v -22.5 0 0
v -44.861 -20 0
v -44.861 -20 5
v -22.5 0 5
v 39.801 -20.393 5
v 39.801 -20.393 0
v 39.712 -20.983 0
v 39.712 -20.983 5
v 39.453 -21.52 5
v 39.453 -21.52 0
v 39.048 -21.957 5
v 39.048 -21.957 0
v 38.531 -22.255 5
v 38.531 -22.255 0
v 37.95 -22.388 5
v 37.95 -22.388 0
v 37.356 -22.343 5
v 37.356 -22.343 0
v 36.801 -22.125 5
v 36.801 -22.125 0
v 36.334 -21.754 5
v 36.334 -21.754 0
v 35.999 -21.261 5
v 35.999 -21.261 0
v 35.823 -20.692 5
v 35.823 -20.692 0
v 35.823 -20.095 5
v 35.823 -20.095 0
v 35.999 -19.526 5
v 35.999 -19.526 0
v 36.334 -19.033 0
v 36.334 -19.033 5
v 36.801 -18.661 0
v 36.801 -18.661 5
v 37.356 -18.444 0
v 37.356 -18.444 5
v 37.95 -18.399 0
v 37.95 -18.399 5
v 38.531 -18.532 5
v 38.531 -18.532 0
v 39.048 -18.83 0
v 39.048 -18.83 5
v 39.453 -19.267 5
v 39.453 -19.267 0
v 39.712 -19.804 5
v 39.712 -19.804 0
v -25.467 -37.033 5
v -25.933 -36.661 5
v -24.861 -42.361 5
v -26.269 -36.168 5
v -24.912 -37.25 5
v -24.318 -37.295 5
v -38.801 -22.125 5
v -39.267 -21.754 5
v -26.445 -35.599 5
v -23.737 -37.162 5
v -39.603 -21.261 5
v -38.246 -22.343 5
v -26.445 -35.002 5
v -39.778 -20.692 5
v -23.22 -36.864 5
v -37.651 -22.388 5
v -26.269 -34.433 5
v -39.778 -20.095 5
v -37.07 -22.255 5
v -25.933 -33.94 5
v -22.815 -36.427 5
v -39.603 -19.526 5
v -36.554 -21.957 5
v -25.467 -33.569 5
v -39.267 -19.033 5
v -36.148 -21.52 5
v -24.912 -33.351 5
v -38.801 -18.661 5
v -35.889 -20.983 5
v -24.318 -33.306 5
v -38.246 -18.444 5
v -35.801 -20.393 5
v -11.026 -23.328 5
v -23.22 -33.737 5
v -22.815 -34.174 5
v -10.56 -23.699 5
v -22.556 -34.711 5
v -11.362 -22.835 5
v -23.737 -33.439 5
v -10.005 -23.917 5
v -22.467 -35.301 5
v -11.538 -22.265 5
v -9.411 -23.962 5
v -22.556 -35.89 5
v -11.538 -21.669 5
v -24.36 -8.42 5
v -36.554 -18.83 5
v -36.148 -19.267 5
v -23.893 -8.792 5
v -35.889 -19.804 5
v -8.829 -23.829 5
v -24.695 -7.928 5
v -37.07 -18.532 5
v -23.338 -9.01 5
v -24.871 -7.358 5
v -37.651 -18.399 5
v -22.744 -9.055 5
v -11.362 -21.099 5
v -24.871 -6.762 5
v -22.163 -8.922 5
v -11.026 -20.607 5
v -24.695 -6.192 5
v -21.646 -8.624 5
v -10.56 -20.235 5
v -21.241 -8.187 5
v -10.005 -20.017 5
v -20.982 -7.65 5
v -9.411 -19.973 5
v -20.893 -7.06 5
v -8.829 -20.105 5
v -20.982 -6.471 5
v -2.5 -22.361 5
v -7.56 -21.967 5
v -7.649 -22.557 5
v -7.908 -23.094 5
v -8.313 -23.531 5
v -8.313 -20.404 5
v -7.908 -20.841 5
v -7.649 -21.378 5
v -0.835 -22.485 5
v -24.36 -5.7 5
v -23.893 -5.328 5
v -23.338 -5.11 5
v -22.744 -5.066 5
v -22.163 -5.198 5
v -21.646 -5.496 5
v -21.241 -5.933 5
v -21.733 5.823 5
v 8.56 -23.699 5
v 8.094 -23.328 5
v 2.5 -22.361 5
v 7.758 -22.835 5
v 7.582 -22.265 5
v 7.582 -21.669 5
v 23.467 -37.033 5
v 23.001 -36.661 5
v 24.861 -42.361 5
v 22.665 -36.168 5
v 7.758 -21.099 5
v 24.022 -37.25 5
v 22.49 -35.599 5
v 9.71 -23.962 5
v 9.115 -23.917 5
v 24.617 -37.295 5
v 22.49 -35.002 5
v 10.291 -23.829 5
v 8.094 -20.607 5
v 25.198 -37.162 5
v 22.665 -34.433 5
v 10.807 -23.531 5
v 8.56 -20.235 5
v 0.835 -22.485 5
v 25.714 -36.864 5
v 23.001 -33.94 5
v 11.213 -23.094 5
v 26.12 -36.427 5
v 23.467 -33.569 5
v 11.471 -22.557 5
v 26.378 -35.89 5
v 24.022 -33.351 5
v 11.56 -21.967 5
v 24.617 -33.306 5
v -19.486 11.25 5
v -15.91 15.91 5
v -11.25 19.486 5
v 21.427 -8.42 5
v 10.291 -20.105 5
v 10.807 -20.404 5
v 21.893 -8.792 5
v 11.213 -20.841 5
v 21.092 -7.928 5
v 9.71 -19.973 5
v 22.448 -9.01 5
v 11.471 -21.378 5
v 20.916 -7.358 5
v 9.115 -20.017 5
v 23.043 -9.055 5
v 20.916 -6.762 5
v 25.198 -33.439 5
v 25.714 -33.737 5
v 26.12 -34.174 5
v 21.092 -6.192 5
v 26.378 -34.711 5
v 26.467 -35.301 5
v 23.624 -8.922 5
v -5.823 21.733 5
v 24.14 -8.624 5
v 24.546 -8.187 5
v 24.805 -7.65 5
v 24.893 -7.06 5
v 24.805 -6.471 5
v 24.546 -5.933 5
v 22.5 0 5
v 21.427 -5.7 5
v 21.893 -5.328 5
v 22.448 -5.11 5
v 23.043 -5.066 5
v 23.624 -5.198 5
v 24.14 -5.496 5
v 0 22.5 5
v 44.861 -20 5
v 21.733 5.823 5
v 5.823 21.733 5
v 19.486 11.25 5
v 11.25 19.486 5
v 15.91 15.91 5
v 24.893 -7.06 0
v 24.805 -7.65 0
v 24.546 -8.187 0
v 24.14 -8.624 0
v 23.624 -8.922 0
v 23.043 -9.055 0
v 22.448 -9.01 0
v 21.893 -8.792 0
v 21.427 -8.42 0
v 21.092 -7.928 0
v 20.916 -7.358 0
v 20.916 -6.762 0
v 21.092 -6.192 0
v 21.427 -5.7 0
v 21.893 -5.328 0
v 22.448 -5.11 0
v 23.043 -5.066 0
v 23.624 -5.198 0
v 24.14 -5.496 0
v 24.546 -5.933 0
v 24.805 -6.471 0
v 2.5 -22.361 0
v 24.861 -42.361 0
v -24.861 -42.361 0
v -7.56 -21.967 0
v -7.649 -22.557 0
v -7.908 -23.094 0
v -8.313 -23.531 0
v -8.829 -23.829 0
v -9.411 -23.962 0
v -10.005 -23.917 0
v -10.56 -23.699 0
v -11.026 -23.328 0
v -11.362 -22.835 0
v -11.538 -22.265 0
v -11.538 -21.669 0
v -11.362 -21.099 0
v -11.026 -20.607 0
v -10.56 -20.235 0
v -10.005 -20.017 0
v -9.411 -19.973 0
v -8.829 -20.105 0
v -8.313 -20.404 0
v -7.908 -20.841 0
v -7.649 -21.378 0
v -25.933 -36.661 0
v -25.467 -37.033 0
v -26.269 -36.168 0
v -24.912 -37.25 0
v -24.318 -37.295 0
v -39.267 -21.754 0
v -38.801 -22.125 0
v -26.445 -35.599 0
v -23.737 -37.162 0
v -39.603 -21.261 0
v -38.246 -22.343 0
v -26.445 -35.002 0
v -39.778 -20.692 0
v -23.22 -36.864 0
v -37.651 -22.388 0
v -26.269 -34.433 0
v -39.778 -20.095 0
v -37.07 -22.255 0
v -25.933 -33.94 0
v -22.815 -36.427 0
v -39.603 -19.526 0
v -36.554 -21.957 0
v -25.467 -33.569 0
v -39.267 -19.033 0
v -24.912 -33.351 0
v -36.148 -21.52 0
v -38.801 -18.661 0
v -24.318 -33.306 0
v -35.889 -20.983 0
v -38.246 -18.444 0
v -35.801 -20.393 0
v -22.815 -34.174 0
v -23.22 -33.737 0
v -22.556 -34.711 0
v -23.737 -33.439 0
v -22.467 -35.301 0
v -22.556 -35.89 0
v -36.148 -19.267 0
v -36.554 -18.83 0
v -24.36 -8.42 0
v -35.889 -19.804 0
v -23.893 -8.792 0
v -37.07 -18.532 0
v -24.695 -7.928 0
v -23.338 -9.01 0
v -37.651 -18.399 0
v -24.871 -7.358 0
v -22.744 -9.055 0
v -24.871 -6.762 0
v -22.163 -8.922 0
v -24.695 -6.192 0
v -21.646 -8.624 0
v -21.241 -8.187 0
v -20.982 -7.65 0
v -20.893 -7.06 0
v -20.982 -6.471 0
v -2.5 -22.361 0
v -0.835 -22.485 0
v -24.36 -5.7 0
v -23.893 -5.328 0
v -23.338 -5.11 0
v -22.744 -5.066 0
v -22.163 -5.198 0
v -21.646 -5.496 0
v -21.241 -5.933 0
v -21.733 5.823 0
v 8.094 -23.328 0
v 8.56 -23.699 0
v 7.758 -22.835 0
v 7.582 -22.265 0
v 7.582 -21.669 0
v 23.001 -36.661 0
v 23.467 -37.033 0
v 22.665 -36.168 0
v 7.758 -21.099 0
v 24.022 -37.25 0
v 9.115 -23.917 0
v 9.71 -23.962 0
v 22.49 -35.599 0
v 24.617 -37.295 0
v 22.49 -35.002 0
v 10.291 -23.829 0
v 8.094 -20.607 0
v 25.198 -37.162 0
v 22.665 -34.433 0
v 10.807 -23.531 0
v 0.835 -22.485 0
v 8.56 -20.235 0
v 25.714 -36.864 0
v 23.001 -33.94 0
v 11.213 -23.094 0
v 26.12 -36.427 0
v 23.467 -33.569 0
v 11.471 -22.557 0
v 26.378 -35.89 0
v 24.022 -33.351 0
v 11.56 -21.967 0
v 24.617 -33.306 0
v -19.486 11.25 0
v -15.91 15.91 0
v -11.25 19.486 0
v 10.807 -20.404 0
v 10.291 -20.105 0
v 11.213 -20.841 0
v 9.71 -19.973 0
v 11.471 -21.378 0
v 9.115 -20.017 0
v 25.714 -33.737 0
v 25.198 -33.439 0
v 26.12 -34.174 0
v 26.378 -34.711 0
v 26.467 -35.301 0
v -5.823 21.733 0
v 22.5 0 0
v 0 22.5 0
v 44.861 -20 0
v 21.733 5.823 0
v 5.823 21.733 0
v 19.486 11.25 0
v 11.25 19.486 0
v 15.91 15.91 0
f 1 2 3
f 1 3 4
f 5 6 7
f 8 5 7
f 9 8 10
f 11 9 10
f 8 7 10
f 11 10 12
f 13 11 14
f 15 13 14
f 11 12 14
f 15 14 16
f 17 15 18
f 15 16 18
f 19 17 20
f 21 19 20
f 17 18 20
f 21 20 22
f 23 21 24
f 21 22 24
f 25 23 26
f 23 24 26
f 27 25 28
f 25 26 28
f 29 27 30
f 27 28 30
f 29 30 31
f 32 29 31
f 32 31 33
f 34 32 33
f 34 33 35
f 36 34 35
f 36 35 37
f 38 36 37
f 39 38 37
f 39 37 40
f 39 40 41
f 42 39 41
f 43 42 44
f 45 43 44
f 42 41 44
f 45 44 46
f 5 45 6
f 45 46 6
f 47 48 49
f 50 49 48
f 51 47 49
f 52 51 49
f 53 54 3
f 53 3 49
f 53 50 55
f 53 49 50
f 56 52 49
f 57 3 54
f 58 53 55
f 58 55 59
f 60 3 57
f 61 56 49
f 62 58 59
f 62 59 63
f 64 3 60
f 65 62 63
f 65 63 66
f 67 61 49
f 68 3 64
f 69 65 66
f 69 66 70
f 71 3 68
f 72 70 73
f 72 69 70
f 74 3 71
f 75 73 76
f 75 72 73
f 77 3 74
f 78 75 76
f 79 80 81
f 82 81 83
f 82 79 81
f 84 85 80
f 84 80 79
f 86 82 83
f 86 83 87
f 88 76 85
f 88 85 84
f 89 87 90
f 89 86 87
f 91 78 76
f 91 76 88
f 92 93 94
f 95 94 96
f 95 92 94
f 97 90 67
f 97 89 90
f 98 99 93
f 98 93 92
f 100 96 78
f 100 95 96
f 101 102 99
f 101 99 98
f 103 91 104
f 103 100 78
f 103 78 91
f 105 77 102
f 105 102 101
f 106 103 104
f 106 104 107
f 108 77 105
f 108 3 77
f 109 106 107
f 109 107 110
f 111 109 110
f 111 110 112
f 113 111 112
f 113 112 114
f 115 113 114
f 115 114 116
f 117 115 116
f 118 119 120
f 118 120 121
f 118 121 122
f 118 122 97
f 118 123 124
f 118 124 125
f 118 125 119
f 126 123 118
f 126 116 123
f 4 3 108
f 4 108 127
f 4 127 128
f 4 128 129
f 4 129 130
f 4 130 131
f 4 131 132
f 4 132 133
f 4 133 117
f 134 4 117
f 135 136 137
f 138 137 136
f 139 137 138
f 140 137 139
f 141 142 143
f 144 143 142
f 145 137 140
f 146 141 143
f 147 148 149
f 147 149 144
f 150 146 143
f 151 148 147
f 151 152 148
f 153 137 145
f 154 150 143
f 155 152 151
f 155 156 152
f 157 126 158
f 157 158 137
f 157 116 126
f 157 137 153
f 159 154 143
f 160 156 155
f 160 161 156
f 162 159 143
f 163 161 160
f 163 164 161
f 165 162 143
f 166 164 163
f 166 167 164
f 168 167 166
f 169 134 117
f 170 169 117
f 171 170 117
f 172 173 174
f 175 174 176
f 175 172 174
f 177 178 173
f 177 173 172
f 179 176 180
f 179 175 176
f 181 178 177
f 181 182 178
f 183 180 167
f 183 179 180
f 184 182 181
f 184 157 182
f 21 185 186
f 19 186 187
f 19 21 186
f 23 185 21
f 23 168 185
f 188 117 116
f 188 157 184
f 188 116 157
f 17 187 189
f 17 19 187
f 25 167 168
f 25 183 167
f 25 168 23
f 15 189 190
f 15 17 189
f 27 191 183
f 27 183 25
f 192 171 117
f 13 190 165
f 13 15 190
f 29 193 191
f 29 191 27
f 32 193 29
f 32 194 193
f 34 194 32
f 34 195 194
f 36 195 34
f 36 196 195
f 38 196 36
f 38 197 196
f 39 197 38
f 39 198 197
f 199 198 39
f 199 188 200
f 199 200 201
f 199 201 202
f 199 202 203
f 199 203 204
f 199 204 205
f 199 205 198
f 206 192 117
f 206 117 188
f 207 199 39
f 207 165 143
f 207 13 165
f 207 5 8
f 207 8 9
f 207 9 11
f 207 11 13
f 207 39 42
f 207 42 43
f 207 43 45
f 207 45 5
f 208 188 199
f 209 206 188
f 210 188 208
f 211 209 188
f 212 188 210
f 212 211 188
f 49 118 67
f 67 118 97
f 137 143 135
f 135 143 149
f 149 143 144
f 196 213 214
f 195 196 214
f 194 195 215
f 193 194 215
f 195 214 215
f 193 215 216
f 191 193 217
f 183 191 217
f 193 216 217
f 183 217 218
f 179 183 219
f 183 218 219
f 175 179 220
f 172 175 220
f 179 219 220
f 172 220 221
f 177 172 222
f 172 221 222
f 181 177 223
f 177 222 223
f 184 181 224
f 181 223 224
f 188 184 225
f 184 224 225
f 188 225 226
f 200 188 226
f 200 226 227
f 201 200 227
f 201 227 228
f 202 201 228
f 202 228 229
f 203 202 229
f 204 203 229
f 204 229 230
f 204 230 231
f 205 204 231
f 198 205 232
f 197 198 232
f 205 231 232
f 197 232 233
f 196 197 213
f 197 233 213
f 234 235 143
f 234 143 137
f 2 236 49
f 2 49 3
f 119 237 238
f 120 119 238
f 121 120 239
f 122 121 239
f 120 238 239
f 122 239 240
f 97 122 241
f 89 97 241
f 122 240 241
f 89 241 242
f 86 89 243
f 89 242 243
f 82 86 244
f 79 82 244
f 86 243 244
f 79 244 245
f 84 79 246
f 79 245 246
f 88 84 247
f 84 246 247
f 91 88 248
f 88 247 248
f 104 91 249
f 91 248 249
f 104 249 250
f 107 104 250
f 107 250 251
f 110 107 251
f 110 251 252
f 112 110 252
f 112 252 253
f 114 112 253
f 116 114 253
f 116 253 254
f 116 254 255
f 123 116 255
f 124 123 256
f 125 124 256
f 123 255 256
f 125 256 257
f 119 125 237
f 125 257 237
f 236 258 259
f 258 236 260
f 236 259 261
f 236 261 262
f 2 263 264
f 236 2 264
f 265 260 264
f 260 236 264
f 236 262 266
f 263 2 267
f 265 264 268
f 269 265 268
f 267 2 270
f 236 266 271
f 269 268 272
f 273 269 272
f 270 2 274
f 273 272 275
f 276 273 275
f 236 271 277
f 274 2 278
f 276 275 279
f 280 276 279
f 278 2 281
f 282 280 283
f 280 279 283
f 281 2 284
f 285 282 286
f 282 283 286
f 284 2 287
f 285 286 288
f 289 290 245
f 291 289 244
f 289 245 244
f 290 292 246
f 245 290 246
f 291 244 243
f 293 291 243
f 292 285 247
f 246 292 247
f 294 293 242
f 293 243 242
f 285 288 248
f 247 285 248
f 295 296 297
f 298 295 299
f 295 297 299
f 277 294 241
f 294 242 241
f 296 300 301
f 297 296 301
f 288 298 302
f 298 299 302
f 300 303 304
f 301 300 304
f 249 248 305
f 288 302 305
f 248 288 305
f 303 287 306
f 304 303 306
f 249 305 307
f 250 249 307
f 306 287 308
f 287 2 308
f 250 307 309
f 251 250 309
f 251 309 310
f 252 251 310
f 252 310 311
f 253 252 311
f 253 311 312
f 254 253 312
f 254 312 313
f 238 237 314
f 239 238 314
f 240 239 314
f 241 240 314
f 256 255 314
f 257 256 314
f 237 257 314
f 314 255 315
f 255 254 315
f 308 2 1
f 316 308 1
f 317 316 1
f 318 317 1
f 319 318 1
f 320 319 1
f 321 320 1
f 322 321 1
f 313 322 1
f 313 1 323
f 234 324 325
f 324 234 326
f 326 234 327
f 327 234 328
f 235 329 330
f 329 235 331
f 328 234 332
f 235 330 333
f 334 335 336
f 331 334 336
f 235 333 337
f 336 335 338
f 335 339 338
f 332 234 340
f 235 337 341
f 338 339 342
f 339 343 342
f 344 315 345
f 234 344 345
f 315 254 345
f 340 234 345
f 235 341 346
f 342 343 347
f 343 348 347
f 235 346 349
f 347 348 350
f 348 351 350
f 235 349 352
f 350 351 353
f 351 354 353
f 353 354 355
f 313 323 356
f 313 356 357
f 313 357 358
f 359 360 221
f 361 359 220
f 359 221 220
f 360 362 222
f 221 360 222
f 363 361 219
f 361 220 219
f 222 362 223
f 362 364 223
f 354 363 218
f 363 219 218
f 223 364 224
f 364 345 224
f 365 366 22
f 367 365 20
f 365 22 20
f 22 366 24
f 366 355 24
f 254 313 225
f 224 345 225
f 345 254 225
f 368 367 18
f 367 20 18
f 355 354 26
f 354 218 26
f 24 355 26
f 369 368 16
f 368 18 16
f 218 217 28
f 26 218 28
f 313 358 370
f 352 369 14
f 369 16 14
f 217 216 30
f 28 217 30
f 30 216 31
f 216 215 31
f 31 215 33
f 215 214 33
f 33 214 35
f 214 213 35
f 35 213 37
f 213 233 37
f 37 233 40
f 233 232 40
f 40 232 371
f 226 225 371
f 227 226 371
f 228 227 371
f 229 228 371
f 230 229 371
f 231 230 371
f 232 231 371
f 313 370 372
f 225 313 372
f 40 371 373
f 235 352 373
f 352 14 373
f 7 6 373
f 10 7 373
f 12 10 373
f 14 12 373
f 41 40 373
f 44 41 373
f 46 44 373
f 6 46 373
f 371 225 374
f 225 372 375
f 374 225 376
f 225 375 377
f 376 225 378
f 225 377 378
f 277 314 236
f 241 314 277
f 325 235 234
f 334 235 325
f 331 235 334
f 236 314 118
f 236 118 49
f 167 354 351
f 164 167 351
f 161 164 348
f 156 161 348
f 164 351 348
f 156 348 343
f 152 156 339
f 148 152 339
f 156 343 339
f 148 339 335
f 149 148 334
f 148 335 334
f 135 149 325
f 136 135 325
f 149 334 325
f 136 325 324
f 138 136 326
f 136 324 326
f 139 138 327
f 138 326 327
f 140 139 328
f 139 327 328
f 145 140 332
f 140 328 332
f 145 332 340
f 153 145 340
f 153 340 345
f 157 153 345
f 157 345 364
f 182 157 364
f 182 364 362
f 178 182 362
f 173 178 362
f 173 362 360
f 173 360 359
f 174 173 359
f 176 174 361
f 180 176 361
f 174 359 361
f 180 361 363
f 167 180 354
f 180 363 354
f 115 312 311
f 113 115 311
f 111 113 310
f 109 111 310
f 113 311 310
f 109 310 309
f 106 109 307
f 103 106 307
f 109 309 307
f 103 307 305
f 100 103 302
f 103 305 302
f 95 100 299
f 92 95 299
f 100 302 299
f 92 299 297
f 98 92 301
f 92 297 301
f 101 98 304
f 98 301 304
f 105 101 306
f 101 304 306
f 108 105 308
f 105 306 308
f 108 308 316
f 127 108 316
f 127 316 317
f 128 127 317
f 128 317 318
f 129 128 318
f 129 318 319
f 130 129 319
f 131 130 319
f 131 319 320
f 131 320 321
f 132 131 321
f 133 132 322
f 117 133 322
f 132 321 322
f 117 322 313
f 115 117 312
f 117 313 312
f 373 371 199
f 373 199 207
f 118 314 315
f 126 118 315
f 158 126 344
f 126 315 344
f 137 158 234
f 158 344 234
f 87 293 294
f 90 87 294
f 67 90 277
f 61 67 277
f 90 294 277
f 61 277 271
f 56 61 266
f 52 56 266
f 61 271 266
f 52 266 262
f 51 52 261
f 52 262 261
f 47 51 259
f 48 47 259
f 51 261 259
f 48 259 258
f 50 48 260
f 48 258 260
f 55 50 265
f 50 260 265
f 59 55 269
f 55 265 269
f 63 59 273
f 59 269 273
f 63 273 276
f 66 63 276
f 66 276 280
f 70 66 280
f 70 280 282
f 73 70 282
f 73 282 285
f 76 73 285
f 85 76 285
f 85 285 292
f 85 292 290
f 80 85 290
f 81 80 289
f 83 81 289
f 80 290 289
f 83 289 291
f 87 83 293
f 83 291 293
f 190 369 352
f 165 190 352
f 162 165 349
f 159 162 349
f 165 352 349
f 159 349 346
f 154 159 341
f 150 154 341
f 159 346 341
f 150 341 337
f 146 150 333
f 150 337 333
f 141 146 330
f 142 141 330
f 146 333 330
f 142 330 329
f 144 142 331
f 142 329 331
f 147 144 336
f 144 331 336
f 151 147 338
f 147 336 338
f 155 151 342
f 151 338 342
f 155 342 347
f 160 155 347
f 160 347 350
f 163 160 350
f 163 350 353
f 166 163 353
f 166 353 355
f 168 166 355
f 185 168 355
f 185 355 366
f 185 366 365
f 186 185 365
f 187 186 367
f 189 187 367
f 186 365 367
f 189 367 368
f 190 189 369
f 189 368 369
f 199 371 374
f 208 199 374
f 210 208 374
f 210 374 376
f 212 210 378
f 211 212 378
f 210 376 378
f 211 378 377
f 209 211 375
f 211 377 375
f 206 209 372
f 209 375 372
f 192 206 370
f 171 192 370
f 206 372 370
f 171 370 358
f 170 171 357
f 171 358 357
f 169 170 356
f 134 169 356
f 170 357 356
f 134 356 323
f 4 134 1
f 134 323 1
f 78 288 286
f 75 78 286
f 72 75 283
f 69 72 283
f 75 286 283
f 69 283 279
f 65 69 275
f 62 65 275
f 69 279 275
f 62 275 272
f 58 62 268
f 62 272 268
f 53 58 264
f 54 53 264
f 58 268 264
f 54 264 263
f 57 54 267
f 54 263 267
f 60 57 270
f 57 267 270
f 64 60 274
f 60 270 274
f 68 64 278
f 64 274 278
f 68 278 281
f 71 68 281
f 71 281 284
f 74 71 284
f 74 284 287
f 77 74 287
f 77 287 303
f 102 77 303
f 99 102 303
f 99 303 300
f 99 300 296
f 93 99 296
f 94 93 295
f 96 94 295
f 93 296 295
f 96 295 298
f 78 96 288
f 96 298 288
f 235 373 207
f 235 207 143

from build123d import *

# Parameters (mm, degrees)
SKETCH2_R           = 22.5
BOSS_EXTRUDE1_DEPTH = 5
SKETCH3_R           = 2
CUT_EXTRUDE1_DEPTH  = 5


with BuildPart() as part:
    # Sketch2 → Boss-Extrude1 (new body)
    with BuildSketch(Plane.XY):
        Circle(SKETCH2_R)
        Polygon((-22.5, 0), (-2.5, -22.360679775), (-24.860679775, -42.360679775), (-44.860679775, -20), align=None)
        Polygon((2.5, -22.360679775), (22.5, 0), (44.860679775, -20), (24.860679775, -42.360679775), align=None)
    extrude(amount=BOSS_EXTRUDE1_DEPTH)

    # Sketch3 → Cut-Extrude1 (cut)
    with BuildSketch(Plane(origin=(0, 0, 0), x_dir=(-1, 0, 0), z_dir=(0, 0, -1))):
        with Locations(Location((-37.800566479, -20.393446629, 0), (0, 0, 180))):
            Circle(SKETCH3_R)
        with Locations(Location((-22.893446629, -7.060113296, 0), (0, 0, 180))):
            Circle(SKETCH3_R)
        with Locations(Location((-9.560113296, -21.967233146, 0), (0, 0, 180))):
            Circle(SKETCH3_R)
        with Locations(Location((-24.467233146, -35.300566479, 0), (0, 0, 180))):
            Circle(SKETCH3_R)
        with Locations(Location((24.467233146, -35.300566479, 0), (0, 0, 180))):
            Circle(SKETCH3_R)
        with Locations(Location((37.800566479, -20.393446629, 0), (0, 0, 180))):
            Circle(SKETCH3_R)
        with Locations(Location((9.560113296, -21.967233146, 0), (0, 0, 180))):
            Circle(SKETCH3_R)
        with Locations(Location((22.893446629, -7.060113296, 0), (0, 0, 180))):
            Circle(SKETCH3_R)
    extrude(amount=-CUT_EXTRUDE1_DEPTH, mode=Mode.SUBTRACT)


solid = part.part
